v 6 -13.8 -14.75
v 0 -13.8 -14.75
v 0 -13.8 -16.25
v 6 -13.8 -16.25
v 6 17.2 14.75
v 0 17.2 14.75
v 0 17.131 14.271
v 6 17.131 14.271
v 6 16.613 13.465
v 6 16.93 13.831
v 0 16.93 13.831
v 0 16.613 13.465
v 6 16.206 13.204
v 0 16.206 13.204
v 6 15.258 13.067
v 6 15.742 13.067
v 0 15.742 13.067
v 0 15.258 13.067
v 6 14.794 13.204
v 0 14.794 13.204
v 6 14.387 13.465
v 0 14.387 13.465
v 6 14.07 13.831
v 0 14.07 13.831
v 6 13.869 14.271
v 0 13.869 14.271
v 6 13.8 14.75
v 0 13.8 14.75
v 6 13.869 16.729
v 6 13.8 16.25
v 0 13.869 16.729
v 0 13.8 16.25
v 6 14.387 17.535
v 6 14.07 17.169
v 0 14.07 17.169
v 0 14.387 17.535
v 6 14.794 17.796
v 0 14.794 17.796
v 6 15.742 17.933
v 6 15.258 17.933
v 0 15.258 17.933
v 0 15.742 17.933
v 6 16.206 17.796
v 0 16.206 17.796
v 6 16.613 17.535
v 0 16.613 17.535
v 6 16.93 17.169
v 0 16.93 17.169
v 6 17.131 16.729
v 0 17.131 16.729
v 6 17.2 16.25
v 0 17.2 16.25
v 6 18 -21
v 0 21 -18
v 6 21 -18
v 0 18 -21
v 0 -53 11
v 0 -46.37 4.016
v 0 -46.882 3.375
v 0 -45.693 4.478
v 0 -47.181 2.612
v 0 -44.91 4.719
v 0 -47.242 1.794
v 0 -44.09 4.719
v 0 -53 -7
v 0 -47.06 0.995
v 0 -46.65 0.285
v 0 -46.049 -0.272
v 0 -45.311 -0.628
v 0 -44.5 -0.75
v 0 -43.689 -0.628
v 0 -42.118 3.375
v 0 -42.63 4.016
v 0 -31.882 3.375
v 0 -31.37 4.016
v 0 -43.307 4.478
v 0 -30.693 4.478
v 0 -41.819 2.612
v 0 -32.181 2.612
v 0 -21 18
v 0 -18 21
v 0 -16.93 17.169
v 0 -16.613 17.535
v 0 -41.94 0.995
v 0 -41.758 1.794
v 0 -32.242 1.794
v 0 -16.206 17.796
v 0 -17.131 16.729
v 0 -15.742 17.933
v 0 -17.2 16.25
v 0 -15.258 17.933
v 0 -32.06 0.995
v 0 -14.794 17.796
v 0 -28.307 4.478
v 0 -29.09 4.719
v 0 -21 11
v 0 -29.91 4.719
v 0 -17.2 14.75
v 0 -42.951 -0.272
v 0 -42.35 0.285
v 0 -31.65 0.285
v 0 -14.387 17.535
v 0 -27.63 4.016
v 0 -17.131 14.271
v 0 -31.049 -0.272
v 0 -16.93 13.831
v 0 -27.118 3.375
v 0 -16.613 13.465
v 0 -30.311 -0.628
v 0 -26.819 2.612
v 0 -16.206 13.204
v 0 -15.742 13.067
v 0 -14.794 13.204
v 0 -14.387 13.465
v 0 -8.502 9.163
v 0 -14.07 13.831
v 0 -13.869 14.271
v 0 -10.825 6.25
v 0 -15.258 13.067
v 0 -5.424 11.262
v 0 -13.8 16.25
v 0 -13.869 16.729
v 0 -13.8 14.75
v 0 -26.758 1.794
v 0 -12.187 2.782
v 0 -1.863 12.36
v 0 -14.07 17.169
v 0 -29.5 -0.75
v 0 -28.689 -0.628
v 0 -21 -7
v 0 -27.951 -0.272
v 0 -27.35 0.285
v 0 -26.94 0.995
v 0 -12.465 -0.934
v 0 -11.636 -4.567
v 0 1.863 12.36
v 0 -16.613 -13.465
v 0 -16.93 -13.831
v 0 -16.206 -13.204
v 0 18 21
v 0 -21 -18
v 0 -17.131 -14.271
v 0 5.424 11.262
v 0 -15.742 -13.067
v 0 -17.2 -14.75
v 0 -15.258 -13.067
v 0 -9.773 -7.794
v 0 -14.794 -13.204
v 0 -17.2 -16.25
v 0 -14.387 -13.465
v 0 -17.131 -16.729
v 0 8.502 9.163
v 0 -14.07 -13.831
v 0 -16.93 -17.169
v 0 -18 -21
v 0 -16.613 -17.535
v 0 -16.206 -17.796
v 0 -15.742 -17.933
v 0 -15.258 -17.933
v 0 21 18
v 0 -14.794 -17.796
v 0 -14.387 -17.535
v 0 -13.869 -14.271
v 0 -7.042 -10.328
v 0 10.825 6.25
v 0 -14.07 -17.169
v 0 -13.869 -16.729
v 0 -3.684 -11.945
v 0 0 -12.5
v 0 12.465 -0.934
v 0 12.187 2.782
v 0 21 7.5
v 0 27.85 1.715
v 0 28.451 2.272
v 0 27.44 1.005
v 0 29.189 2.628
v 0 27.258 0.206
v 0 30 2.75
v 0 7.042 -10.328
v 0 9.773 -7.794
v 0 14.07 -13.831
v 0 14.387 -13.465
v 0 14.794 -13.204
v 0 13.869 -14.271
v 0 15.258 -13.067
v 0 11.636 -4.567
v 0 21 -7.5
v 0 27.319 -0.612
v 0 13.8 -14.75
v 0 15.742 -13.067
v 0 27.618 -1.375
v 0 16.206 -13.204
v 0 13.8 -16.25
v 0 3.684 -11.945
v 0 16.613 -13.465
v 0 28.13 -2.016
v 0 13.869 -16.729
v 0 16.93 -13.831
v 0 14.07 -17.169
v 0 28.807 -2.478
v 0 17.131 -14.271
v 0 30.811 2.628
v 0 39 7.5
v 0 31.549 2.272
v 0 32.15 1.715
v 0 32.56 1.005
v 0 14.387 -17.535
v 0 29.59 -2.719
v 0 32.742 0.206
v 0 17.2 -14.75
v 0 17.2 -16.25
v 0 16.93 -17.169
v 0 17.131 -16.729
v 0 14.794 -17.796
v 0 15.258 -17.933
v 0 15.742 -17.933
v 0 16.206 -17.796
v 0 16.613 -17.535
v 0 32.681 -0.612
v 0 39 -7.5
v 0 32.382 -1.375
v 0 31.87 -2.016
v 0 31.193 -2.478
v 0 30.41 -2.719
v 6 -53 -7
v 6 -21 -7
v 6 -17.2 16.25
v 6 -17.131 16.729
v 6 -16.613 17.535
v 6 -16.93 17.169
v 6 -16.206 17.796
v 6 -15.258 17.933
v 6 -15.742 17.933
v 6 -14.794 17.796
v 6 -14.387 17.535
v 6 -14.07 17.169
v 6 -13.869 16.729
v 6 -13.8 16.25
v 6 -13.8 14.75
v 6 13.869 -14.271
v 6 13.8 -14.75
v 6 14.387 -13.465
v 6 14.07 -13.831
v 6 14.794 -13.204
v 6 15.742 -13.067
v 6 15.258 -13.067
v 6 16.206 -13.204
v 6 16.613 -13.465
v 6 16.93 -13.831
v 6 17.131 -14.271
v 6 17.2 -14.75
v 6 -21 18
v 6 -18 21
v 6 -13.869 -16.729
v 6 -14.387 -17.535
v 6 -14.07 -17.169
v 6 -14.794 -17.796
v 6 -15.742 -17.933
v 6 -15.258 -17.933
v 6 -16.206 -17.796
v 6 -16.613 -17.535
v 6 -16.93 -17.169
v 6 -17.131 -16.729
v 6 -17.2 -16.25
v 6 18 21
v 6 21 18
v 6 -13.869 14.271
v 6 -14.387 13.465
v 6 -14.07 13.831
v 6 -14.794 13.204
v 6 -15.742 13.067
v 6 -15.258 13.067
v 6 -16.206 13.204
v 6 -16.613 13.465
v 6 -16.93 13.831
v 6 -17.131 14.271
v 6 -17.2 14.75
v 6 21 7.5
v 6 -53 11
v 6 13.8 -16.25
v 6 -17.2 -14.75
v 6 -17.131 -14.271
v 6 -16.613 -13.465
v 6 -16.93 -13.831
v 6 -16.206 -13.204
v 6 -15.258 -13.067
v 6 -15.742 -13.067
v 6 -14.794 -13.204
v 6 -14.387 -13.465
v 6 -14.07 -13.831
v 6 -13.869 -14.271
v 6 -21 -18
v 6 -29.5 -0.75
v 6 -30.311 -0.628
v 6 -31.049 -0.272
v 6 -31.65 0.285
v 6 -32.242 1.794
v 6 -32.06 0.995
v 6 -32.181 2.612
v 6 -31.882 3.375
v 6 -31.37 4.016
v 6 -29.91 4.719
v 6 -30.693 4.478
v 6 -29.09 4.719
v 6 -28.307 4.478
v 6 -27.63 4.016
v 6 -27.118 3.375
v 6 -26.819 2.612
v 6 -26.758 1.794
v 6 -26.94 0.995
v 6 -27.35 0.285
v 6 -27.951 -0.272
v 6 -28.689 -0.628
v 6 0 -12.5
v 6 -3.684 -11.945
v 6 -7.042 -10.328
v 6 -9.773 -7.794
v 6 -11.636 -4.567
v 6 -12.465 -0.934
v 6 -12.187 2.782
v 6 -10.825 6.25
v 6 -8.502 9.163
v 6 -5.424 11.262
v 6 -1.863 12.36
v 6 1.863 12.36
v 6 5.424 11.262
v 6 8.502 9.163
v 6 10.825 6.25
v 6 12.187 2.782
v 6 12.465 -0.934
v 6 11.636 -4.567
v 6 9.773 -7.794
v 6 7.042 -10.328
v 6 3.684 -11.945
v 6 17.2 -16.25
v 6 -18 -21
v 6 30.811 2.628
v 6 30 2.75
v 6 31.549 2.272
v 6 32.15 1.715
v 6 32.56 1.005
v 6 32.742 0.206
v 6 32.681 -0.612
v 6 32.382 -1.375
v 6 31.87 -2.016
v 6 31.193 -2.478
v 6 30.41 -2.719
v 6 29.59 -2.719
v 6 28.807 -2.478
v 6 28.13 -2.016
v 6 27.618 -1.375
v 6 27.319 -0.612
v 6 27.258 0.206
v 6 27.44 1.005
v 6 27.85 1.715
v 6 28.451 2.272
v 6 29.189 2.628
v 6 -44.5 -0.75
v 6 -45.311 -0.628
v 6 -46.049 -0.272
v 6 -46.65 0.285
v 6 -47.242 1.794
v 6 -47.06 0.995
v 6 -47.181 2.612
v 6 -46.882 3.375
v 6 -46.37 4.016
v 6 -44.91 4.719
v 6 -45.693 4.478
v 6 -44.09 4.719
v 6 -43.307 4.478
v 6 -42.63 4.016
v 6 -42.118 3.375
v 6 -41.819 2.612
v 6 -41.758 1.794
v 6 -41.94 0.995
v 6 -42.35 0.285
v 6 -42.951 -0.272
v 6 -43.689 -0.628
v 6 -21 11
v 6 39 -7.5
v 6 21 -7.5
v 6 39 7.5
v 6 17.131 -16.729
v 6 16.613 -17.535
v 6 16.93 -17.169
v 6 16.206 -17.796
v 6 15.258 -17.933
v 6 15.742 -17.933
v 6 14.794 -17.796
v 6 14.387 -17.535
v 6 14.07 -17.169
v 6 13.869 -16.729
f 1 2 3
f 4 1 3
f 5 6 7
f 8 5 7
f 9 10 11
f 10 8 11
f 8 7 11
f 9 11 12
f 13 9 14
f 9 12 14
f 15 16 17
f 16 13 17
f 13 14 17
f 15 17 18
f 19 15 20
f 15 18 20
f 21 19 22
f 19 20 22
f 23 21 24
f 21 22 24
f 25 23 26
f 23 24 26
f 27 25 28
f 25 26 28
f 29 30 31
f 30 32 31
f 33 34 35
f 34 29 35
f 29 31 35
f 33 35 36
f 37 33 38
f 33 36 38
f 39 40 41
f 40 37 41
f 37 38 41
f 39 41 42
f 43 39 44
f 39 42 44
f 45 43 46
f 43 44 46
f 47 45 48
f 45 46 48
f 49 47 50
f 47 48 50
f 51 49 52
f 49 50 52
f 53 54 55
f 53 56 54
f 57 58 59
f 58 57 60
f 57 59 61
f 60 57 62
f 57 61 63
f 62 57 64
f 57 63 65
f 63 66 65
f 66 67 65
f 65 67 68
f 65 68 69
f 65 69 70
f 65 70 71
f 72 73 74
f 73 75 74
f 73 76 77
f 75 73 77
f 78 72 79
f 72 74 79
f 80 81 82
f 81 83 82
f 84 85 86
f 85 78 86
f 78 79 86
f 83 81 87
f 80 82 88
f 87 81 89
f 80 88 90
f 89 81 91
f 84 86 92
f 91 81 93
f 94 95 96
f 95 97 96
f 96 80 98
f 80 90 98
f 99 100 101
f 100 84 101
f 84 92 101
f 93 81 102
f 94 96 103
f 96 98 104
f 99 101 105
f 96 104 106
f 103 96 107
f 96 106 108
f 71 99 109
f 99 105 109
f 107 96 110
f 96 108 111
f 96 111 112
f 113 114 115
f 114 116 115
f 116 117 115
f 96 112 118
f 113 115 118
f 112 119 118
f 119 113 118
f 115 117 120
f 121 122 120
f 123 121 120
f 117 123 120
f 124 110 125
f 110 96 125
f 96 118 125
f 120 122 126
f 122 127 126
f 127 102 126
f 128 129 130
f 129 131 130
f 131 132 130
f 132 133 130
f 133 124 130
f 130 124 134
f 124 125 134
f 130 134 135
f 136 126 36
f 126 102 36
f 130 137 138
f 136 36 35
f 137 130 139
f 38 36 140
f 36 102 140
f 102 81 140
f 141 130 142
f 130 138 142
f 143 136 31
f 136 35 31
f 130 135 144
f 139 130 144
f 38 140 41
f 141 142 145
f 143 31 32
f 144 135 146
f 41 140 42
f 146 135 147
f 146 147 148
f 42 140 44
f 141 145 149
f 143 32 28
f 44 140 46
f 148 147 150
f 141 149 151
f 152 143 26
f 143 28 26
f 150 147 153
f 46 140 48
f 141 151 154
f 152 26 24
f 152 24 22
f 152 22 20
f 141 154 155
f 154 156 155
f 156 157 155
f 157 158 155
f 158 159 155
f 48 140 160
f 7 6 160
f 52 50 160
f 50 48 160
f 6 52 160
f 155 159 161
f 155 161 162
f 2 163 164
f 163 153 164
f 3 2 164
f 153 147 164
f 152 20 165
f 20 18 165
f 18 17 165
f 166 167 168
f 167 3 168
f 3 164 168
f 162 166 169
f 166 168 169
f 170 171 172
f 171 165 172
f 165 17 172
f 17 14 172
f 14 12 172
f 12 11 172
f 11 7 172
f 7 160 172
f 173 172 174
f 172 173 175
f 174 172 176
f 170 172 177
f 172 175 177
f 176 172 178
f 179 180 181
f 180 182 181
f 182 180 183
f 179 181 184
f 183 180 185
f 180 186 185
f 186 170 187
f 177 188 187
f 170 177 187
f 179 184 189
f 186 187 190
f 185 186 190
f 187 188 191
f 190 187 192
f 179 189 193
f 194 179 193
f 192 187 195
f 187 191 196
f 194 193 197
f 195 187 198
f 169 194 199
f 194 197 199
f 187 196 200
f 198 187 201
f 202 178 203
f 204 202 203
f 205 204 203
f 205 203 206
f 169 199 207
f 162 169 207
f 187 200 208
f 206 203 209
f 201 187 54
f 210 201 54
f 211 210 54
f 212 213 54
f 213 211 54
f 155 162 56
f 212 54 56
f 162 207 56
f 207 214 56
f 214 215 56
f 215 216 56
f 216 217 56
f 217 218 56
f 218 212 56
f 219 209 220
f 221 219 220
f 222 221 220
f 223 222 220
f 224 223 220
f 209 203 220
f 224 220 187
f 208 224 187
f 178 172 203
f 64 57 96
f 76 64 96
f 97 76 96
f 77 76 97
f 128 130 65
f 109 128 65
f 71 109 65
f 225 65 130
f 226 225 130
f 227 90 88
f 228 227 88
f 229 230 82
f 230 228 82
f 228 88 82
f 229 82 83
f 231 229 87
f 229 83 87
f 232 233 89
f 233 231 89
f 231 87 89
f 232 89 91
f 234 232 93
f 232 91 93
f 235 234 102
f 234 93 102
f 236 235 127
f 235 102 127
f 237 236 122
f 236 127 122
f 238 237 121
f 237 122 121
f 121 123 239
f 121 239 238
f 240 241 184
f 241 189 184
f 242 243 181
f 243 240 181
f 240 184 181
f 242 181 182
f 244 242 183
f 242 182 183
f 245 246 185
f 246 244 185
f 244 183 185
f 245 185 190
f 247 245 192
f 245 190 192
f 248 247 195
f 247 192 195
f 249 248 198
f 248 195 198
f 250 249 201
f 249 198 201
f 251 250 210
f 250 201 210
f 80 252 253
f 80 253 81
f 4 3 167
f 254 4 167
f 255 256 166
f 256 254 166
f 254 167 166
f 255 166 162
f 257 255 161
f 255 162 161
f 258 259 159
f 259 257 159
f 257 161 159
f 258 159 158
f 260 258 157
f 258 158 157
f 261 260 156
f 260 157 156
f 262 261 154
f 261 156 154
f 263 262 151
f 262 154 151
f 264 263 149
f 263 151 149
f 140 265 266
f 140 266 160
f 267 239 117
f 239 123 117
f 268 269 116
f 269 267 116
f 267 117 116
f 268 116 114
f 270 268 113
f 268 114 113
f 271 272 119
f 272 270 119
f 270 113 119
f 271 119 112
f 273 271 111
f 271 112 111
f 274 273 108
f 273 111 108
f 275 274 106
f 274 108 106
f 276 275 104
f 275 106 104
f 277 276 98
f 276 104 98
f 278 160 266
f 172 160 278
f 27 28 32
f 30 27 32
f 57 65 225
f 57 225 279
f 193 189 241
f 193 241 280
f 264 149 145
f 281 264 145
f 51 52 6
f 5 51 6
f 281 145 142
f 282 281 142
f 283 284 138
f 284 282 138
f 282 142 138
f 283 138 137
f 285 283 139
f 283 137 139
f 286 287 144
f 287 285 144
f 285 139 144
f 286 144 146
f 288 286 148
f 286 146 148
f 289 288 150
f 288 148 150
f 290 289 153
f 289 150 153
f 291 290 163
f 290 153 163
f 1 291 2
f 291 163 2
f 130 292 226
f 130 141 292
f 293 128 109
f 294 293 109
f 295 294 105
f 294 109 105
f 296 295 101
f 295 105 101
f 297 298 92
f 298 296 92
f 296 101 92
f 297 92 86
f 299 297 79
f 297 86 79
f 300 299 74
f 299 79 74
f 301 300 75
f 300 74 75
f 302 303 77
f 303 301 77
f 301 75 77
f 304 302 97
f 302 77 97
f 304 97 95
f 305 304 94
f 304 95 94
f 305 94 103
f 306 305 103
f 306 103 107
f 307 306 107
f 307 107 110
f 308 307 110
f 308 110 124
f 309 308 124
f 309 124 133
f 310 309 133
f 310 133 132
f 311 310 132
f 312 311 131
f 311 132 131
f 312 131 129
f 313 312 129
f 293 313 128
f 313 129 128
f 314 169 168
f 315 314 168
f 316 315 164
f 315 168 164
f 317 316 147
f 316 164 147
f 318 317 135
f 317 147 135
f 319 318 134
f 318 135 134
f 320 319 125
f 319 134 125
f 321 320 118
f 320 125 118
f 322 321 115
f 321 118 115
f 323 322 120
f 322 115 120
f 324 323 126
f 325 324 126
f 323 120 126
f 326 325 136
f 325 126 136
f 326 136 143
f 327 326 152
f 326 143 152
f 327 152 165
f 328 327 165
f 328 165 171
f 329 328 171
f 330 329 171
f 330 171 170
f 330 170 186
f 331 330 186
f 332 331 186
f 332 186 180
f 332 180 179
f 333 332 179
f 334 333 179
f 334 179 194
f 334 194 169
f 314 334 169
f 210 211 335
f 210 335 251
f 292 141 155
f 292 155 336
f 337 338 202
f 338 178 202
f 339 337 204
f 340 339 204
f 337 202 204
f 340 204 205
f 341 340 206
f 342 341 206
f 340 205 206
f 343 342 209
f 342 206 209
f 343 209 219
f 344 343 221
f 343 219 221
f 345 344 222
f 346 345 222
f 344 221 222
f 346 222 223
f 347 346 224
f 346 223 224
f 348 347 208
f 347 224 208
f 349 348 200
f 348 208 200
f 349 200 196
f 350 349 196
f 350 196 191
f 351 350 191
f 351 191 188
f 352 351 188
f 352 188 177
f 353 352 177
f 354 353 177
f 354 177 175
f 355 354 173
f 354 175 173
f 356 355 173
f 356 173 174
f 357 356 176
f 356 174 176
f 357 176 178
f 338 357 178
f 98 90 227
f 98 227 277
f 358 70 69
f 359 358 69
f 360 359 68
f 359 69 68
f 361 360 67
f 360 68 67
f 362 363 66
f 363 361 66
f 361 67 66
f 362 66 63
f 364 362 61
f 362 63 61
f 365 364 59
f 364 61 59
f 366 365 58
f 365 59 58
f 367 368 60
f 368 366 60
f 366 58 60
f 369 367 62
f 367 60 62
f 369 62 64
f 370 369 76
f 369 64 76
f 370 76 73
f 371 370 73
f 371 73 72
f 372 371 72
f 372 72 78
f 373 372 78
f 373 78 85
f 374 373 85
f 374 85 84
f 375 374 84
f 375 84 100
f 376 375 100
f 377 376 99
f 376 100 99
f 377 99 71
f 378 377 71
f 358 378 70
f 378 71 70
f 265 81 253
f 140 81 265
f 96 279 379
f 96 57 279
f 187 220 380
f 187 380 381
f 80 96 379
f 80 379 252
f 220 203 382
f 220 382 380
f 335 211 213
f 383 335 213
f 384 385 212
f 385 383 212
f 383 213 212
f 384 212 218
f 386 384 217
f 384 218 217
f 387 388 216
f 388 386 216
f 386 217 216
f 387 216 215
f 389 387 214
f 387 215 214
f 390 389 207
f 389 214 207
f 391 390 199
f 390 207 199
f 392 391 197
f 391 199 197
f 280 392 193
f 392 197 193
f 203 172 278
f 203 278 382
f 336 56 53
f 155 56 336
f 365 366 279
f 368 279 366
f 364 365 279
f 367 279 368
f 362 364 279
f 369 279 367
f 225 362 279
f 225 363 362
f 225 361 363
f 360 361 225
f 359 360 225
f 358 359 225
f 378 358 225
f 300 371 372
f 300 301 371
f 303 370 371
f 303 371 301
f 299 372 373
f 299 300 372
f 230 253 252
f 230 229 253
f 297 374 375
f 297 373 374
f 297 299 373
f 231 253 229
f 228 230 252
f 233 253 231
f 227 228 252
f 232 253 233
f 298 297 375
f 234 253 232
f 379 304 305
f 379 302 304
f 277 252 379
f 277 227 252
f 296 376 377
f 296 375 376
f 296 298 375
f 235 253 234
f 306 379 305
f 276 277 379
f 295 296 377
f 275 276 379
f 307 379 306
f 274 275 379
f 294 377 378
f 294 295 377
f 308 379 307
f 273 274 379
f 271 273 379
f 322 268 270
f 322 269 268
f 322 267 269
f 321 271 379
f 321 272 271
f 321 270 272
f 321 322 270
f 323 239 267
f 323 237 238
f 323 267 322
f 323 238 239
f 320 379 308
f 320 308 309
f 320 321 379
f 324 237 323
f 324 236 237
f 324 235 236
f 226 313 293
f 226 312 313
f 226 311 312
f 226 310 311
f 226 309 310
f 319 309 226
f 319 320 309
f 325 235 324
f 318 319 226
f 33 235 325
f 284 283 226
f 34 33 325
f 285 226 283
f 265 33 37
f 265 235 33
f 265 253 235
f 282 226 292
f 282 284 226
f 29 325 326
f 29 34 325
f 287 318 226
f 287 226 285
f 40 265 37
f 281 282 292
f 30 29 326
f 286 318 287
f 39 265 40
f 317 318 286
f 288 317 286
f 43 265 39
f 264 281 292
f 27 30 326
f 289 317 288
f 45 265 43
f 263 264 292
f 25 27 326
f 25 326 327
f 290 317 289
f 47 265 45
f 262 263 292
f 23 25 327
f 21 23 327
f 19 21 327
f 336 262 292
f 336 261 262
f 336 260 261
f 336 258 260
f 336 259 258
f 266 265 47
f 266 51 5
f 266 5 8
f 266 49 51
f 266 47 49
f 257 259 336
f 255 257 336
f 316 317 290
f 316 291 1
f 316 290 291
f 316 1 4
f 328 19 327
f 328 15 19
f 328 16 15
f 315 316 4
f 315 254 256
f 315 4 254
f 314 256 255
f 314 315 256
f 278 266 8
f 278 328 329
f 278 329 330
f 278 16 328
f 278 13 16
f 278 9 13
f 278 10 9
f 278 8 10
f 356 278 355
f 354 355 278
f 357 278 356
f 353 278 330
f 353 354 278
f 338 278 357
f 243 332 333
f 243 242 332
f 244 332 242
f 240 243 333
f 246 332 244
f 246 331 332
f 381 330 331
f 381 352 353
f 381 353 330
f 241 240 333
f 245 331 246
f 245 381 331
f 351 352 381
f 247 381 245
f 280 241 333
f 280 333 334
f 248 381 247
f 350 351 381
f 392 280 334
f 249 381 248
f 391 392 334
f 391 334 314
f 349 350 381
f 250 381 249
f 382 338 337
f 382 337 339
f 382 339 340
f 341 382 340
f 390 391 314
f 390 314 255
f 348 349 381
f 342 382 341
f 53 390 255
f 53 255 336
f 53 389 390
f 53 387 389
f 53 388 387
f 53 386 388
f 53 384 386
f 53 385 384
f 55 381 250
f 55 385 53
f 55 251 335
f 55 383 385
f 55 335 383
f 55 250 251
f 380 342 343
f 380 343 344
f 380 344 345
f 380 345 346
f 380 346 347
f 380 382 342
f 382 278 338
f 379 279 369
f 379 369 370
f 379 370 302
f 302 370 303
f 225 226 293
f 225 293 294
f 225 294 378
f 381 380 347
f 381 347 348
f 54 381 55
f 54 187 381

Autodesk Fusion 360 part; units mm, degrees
sketch "Sketch1" plane through (0, 0, 0) normal (1, 0, 0) x (0, 0, -1)
  line L0 (-21, 21) -> (21, 21)
  line L1 (21, 21) -> (21, -21)
  line L2 (21, -21) -> (-21, -21)
  line L3 (-21, -21) -> (-21, 21)
  line L4 (-11, -21) -> (7, -21)
  line L5 (7, -53) -> (-11, -53)
  line L6 (-11, -53) -> (-11, -21)
  line L7 (-21, 0) -> (21, 0) construction
  circle A0 centre (0, 0) radius 12.5
  circle A1 centre (-2, -29.5) radius 2.75
  circle A2 centre (-2, -44.5) radius 2.75
  line L8 (-2, -44.5) -> (-2, -29.5) construction
  line L9 (-16.25, 17.2) -> (-14.75, 17.2)
  arc A3 (-14.75, 13.8) -> (-14.75, 17.2) centre (-14.75, 15.5) ccw
  line L10 (-14.75, 13.8) -> (-16.25, 13.8)
  arc A4 (-16.25, 17.2) -> (-16.25, 13.8) centre (-16.25, 15.5) ccw
  line L11 (-14.75, 15.5) -> (-16.25, 15.5) construction
  line L12 (0, 20) -> (0, 2.5)
  line L13 (14.75, 13.8) -> (16.25, 13.8)
  arc A5 (16.25, 13.8) -> (16.25, 17.2) centre (16.25, 15.5) ccw
  line L14 (16.25, 17.2) -> (14.75, 17.2)
  arc A6 (14.75, 17.2) -> (14.75, 13.8) centre (14.75, 15.5) ccw
  arc A7 (-14.75, -17.2) -> (-14.75, -13.8) centre (-14.75, -15.5) ccw
  line L15 (-14.75, -13.8) -> (-16.25, -13.8)
  arc A8 (-16.25, -13.8) -> (-16.25, -17.2) centre (-16.25, -15.5) ccw
  line L16 (-16.25, -17.2) -> (-14.75, -17.2)
  arc A9 (14.75, -13.8) -> (14.75, -17.2) centre (14.75, -15.5) ccw
  line L17 (16.25, -17.2) -> (14.75, -17.2)
  arc A10 (16.25, -17.2) -> (16.25, -13.8) centre (16.25, -15.5) ccw
  line L18 (14.75, -13.8) -> (16.25, -13.8)
  line L19 (7, -53) -> (7, -21)
  point P0 (-2, -53)
  point P1 (-2, -37)
  point P2 (-15.5, 15.5)
  dimension "d1" = 42
  dimension "d4" = 42
  dimension "d8" = 25
  dimension "d9" = 5.5
  dimension "d12" = 5.5
  dimension "d13" = 15
  dimension "d28" = 1.5
  dimension "d29" = 15.5
  dimension "d30" = 15.5
  dimension "d31" = 1.7
  dimension "d32" = 32
  dimension "d33" = 18
  dimension "d34" = 16
  dimension "d35" = 2
extrude "Extrude1" add sketch "Sketch1" along normal blind 6
sketch "Sketch4" plane through (0, 0, 0) normal (-1, 0, 0) x (0, 0, 1)
  circle A0 centre (0, 0) radius 12.5
  line L0 (21, -21) -> (21, 21)
  line L1 (21, 21) -> (-21, 21)
  line L2 (-7.5, 21) -> (7.5, 21)
  line L3 (7.5, 21) -> (7.5, 39)
  line L4 (7.5, 39) -> (-7.5, 39)
  line L5 (-7.5, 39) -> (-7.5, 21)
  line L6 (-21, 21) -> (-21, -21)
  line L7 (-21, -21) -> (-7, -21)
  circle A1 centre (2, -44.5) radius 2.75
  circle A2 centre (2, -29.5) radius 2.75
  line L8 (-7, -53) -> (11, -53)
  line L9 (11, -53) -> (11, -21)
  line L10 (11, -21) -> (21, -21)
  line L11 (-7, -21) -> (-7, -53)
  arc A3 (-14.75, 13.8) -> (-14.75, 17.2) centre (-14.75, 15.5) ccw
  line L12 (-14.75, 13.8) -> (-16.25, 13.8)
  arc A4 (-16.25, 17.2) -> (-16.25, 13.8) centre (-16.25, 15.5) ccw
  line L13 (-16.25, 17.2) -> (-14.75, 17.2)
  line L14 (16.25, -17.2) -> (14.75, -17.2)
  arc A5 (14.75, -13.8) -> (14.75, -17.2) centre (14.75, -15.5) ccw
  line L15 (14.75, -13.8) -> (16.25, -13.8)
  arc A6 (16.25, -17.2) -> (16.25, -13.8) centre (16.25, -15.5) ccw
  arc A7 (-16.25, -13.8) -> (-16.25, -17.2) centre (-16.25, -15.5) ccw
  line L16 (-16.25, -13.8) -> (-14.75, -13.8)
  arc A8 (-14.75, -17.2) -> (-14.75, -13.8) centre (-14.75, -15.5) ccw
  line L17 (-14.75, -17.2) -> (-16.25, -17.2)
  arc A9 (14.75, 17.2) -> (14.75, 13.8) centre (14.75, 15.5) ccw
  line L18 (14.75, 17.2) -> (16.25, 17.2)
  arc A10 (16.25, 13.8) -> (16.25, 17.2) centre (16.25, 15.5) ccw
  line L19 (16.25, 13.8) -> (14.75, 13.8)
  point P0 (0, 21)
  dimension "d18" = 18
  dimension "d19" = 15
extrude "Extrude2" add sketch "Sketch4" against normal up to surface (6 mm away) contours L1 L2 L3 L4 L5
sketch "Sketch5" plane through (0, 0, 0) normal (-1, 0, 0) x (0, 0, 1)
  circle A0 centre (0, 0) radius 12.5
  line L0 (21, -21) -> (21, 21)
  line L1 (21, 21) -> (7.5, 21)
  line L2 (7.5, 21) -> (7.5, 39)
  line L3 (7.5, 39) -> (-7.5, 39)
  line L4 (-7.5, 39) -> (-7.5, 21)
  line L5 (-7.5, 21) -> (-21, 21)
  circle A1 centre (0, 30) radius 2.75
  line L6 (-21, 21) -> (-21, -21)
  line L7 (-21, -21) -> (-7, -21)
  circle A2 centre (2, -44.5) radius 2.75
  circle A3 centre (2, -29.5) radius 2.75
  line L8 (-7, -53) -> (11, -53)
  line L9 (11, -53) -> (11, -21)
  line L10 (11, -21) -> (21, -21)
  line L11 (-7, -21) -> (-7, -53)
  arc A4 (-14.75, 13.8) -> (-14.75, 17.2) centre (-14.75, 15.5) ccw
  line L12 (-14.75, 13.8) -> (-16.25, 13.8)
  arc A5 (-16.25, 17.2) -> (-16.25, 13.8) centre (-16.25, 15.5) ccw
  line L13 (-16.25, 17.2) -> (-14.75, 17.2)
  line L14 (16.25, -17.2) -> (14.75, -17.2)
  arc A6 (14.75, -13.8) -> (14.75, -17.2) centre (14.75, -15.5) ccw
  line L15 (14.75, -13.8) -> (16.25, -13.8)
  arc A7 (16.25, -17.2) -> (16.25, -13.8) centre (16.25, -15.5) ccw
  arc A8 (-16.25, -13.8) -> (-16.25, -17.2) centre (-16.25, -15.5) ccw
  line L16 (-16.25, -13.8) -> (-14.75, -13.8)
  arc A9 (-14.75, -17.2) -> (-14.75, -13.8) centre (-14.75, -15.5) ccw
  line L17 (-14.75, -17.2) -> (-16.25, -17.2)
  arc A10 (14.75, 17.2) -> (14.75, 13.8) centre (14.75, 15.5) ccw
  line L18 (14.75, 17.2) -> (16.25, 17.2)
  arc A11 (16.25, 13.8) -> (16.25, 17.2) centre (16.25, 15.5) ccw
  line L19 (16.25, 13.8) -> (14.75, 13.8)
  dimension "d22" = 30
  dimension "d23" = 5.5
extrude "Extrude3" cut sketch "Sketch5" against normal blind 30 contours A1
chamfer "Chamfer1" distance 3 angle 45 4 edges at (3, 21, 21) (3, -21, 21) (3, -21, -21) (3, 21, -21)
sketch "Sketch6" plane through (6, 0, 0) normal (1, 0, 0) x (0, 0, -1)
  line L0 (18, 21) -> (7.5, 21)
  line L1 (7.5, 21) -> (7.5, 39)
  line L2 (7.5, 39) -> (-7.5, 39)
  line L3 (-7.5, 39) -> (-7.5, 21)
  line L4 (-7.5, 21) -> (-18, 21)
  line L5 (-18, 21) -> (-21, 18)
  line L6 (-21, 18) -> (-21, -18)
  circle A0 centre (0, 0) radius 12.5
  circle A1 centre (0, 30) radius 2.75
  line L7 (7, -21) -> (18, -21)
  line L8 (21, -18) -> (21, 18)
  circle A2 centre (-2, -44.5) radius 2.75
  circle A3 centre (-2, -29.5) radius 2.75
  line L9 (-21, -18) -> (-18, -21)
  line L10 (-18, -21) -> (-11, -21)
  line L11 (-11, -21) -> (-11, -53)
  line L12 (-11, -53) -> (7, -53)
  line L13 (7, -53) -> (7, -21)
  line L14 (21, 18) -> (18, 21)
  line L15 (18, -21) -> (21, -18)
  arc A4 (14.75, 17.2) -> (14.75, 13.8) centre (14.75, 15.5) ccw
  line L16 (14.75, 17.2) -> (16.25, 17.2)
  arc A5 (16.25, 13.8) -> (16.25, 17.2) centre (16.25, 15.5) ccw
  line L17 (16.25, 13.8) -> (14.75, 13.8)
  line L18 (-14.75, -17.2) -> (-16.25, -17.2)
  arc A6 (-16.25, -13.8) -> (-16.25, -17.2) centre (-16.25, -15.5) ccw
  line L19 (-16.25, -13.8) -> (-14.75, -13.8)
  arc A7 (-14.75, -17.2) -> (-14.75, -13.8) centre (-14.75, -15.5) ccw
  arc A8 (16.25, -17.2) -> (16.25, -13.8) centre (16.25, -15.5) ccw
  line L20 (16.25, -17.2) -> (14.75, -17.2)
  arc A9 (14.75, -13.8) -> (14.75, -17.2) centre (14.75, -15.5) ccw
  line L21 (14.75, -13.8) -> (16.25, -13.8)
  arc A10 (-14.75, 13.8) -> (-14.75, 17.2) centre (-14.75, 15.5) ccw
  line L22 (-14.75, 13.8) -> (-16.25, 13.8)
  arc A11 (-16.25, 17.2) -> (-16.25, 13.8) centre (-16.25, 15.5) ccw
  line L23 (-16.25, 17.2) -> (-14.75, 17.2)
equation "d31 = 3.4 mm / 2"
